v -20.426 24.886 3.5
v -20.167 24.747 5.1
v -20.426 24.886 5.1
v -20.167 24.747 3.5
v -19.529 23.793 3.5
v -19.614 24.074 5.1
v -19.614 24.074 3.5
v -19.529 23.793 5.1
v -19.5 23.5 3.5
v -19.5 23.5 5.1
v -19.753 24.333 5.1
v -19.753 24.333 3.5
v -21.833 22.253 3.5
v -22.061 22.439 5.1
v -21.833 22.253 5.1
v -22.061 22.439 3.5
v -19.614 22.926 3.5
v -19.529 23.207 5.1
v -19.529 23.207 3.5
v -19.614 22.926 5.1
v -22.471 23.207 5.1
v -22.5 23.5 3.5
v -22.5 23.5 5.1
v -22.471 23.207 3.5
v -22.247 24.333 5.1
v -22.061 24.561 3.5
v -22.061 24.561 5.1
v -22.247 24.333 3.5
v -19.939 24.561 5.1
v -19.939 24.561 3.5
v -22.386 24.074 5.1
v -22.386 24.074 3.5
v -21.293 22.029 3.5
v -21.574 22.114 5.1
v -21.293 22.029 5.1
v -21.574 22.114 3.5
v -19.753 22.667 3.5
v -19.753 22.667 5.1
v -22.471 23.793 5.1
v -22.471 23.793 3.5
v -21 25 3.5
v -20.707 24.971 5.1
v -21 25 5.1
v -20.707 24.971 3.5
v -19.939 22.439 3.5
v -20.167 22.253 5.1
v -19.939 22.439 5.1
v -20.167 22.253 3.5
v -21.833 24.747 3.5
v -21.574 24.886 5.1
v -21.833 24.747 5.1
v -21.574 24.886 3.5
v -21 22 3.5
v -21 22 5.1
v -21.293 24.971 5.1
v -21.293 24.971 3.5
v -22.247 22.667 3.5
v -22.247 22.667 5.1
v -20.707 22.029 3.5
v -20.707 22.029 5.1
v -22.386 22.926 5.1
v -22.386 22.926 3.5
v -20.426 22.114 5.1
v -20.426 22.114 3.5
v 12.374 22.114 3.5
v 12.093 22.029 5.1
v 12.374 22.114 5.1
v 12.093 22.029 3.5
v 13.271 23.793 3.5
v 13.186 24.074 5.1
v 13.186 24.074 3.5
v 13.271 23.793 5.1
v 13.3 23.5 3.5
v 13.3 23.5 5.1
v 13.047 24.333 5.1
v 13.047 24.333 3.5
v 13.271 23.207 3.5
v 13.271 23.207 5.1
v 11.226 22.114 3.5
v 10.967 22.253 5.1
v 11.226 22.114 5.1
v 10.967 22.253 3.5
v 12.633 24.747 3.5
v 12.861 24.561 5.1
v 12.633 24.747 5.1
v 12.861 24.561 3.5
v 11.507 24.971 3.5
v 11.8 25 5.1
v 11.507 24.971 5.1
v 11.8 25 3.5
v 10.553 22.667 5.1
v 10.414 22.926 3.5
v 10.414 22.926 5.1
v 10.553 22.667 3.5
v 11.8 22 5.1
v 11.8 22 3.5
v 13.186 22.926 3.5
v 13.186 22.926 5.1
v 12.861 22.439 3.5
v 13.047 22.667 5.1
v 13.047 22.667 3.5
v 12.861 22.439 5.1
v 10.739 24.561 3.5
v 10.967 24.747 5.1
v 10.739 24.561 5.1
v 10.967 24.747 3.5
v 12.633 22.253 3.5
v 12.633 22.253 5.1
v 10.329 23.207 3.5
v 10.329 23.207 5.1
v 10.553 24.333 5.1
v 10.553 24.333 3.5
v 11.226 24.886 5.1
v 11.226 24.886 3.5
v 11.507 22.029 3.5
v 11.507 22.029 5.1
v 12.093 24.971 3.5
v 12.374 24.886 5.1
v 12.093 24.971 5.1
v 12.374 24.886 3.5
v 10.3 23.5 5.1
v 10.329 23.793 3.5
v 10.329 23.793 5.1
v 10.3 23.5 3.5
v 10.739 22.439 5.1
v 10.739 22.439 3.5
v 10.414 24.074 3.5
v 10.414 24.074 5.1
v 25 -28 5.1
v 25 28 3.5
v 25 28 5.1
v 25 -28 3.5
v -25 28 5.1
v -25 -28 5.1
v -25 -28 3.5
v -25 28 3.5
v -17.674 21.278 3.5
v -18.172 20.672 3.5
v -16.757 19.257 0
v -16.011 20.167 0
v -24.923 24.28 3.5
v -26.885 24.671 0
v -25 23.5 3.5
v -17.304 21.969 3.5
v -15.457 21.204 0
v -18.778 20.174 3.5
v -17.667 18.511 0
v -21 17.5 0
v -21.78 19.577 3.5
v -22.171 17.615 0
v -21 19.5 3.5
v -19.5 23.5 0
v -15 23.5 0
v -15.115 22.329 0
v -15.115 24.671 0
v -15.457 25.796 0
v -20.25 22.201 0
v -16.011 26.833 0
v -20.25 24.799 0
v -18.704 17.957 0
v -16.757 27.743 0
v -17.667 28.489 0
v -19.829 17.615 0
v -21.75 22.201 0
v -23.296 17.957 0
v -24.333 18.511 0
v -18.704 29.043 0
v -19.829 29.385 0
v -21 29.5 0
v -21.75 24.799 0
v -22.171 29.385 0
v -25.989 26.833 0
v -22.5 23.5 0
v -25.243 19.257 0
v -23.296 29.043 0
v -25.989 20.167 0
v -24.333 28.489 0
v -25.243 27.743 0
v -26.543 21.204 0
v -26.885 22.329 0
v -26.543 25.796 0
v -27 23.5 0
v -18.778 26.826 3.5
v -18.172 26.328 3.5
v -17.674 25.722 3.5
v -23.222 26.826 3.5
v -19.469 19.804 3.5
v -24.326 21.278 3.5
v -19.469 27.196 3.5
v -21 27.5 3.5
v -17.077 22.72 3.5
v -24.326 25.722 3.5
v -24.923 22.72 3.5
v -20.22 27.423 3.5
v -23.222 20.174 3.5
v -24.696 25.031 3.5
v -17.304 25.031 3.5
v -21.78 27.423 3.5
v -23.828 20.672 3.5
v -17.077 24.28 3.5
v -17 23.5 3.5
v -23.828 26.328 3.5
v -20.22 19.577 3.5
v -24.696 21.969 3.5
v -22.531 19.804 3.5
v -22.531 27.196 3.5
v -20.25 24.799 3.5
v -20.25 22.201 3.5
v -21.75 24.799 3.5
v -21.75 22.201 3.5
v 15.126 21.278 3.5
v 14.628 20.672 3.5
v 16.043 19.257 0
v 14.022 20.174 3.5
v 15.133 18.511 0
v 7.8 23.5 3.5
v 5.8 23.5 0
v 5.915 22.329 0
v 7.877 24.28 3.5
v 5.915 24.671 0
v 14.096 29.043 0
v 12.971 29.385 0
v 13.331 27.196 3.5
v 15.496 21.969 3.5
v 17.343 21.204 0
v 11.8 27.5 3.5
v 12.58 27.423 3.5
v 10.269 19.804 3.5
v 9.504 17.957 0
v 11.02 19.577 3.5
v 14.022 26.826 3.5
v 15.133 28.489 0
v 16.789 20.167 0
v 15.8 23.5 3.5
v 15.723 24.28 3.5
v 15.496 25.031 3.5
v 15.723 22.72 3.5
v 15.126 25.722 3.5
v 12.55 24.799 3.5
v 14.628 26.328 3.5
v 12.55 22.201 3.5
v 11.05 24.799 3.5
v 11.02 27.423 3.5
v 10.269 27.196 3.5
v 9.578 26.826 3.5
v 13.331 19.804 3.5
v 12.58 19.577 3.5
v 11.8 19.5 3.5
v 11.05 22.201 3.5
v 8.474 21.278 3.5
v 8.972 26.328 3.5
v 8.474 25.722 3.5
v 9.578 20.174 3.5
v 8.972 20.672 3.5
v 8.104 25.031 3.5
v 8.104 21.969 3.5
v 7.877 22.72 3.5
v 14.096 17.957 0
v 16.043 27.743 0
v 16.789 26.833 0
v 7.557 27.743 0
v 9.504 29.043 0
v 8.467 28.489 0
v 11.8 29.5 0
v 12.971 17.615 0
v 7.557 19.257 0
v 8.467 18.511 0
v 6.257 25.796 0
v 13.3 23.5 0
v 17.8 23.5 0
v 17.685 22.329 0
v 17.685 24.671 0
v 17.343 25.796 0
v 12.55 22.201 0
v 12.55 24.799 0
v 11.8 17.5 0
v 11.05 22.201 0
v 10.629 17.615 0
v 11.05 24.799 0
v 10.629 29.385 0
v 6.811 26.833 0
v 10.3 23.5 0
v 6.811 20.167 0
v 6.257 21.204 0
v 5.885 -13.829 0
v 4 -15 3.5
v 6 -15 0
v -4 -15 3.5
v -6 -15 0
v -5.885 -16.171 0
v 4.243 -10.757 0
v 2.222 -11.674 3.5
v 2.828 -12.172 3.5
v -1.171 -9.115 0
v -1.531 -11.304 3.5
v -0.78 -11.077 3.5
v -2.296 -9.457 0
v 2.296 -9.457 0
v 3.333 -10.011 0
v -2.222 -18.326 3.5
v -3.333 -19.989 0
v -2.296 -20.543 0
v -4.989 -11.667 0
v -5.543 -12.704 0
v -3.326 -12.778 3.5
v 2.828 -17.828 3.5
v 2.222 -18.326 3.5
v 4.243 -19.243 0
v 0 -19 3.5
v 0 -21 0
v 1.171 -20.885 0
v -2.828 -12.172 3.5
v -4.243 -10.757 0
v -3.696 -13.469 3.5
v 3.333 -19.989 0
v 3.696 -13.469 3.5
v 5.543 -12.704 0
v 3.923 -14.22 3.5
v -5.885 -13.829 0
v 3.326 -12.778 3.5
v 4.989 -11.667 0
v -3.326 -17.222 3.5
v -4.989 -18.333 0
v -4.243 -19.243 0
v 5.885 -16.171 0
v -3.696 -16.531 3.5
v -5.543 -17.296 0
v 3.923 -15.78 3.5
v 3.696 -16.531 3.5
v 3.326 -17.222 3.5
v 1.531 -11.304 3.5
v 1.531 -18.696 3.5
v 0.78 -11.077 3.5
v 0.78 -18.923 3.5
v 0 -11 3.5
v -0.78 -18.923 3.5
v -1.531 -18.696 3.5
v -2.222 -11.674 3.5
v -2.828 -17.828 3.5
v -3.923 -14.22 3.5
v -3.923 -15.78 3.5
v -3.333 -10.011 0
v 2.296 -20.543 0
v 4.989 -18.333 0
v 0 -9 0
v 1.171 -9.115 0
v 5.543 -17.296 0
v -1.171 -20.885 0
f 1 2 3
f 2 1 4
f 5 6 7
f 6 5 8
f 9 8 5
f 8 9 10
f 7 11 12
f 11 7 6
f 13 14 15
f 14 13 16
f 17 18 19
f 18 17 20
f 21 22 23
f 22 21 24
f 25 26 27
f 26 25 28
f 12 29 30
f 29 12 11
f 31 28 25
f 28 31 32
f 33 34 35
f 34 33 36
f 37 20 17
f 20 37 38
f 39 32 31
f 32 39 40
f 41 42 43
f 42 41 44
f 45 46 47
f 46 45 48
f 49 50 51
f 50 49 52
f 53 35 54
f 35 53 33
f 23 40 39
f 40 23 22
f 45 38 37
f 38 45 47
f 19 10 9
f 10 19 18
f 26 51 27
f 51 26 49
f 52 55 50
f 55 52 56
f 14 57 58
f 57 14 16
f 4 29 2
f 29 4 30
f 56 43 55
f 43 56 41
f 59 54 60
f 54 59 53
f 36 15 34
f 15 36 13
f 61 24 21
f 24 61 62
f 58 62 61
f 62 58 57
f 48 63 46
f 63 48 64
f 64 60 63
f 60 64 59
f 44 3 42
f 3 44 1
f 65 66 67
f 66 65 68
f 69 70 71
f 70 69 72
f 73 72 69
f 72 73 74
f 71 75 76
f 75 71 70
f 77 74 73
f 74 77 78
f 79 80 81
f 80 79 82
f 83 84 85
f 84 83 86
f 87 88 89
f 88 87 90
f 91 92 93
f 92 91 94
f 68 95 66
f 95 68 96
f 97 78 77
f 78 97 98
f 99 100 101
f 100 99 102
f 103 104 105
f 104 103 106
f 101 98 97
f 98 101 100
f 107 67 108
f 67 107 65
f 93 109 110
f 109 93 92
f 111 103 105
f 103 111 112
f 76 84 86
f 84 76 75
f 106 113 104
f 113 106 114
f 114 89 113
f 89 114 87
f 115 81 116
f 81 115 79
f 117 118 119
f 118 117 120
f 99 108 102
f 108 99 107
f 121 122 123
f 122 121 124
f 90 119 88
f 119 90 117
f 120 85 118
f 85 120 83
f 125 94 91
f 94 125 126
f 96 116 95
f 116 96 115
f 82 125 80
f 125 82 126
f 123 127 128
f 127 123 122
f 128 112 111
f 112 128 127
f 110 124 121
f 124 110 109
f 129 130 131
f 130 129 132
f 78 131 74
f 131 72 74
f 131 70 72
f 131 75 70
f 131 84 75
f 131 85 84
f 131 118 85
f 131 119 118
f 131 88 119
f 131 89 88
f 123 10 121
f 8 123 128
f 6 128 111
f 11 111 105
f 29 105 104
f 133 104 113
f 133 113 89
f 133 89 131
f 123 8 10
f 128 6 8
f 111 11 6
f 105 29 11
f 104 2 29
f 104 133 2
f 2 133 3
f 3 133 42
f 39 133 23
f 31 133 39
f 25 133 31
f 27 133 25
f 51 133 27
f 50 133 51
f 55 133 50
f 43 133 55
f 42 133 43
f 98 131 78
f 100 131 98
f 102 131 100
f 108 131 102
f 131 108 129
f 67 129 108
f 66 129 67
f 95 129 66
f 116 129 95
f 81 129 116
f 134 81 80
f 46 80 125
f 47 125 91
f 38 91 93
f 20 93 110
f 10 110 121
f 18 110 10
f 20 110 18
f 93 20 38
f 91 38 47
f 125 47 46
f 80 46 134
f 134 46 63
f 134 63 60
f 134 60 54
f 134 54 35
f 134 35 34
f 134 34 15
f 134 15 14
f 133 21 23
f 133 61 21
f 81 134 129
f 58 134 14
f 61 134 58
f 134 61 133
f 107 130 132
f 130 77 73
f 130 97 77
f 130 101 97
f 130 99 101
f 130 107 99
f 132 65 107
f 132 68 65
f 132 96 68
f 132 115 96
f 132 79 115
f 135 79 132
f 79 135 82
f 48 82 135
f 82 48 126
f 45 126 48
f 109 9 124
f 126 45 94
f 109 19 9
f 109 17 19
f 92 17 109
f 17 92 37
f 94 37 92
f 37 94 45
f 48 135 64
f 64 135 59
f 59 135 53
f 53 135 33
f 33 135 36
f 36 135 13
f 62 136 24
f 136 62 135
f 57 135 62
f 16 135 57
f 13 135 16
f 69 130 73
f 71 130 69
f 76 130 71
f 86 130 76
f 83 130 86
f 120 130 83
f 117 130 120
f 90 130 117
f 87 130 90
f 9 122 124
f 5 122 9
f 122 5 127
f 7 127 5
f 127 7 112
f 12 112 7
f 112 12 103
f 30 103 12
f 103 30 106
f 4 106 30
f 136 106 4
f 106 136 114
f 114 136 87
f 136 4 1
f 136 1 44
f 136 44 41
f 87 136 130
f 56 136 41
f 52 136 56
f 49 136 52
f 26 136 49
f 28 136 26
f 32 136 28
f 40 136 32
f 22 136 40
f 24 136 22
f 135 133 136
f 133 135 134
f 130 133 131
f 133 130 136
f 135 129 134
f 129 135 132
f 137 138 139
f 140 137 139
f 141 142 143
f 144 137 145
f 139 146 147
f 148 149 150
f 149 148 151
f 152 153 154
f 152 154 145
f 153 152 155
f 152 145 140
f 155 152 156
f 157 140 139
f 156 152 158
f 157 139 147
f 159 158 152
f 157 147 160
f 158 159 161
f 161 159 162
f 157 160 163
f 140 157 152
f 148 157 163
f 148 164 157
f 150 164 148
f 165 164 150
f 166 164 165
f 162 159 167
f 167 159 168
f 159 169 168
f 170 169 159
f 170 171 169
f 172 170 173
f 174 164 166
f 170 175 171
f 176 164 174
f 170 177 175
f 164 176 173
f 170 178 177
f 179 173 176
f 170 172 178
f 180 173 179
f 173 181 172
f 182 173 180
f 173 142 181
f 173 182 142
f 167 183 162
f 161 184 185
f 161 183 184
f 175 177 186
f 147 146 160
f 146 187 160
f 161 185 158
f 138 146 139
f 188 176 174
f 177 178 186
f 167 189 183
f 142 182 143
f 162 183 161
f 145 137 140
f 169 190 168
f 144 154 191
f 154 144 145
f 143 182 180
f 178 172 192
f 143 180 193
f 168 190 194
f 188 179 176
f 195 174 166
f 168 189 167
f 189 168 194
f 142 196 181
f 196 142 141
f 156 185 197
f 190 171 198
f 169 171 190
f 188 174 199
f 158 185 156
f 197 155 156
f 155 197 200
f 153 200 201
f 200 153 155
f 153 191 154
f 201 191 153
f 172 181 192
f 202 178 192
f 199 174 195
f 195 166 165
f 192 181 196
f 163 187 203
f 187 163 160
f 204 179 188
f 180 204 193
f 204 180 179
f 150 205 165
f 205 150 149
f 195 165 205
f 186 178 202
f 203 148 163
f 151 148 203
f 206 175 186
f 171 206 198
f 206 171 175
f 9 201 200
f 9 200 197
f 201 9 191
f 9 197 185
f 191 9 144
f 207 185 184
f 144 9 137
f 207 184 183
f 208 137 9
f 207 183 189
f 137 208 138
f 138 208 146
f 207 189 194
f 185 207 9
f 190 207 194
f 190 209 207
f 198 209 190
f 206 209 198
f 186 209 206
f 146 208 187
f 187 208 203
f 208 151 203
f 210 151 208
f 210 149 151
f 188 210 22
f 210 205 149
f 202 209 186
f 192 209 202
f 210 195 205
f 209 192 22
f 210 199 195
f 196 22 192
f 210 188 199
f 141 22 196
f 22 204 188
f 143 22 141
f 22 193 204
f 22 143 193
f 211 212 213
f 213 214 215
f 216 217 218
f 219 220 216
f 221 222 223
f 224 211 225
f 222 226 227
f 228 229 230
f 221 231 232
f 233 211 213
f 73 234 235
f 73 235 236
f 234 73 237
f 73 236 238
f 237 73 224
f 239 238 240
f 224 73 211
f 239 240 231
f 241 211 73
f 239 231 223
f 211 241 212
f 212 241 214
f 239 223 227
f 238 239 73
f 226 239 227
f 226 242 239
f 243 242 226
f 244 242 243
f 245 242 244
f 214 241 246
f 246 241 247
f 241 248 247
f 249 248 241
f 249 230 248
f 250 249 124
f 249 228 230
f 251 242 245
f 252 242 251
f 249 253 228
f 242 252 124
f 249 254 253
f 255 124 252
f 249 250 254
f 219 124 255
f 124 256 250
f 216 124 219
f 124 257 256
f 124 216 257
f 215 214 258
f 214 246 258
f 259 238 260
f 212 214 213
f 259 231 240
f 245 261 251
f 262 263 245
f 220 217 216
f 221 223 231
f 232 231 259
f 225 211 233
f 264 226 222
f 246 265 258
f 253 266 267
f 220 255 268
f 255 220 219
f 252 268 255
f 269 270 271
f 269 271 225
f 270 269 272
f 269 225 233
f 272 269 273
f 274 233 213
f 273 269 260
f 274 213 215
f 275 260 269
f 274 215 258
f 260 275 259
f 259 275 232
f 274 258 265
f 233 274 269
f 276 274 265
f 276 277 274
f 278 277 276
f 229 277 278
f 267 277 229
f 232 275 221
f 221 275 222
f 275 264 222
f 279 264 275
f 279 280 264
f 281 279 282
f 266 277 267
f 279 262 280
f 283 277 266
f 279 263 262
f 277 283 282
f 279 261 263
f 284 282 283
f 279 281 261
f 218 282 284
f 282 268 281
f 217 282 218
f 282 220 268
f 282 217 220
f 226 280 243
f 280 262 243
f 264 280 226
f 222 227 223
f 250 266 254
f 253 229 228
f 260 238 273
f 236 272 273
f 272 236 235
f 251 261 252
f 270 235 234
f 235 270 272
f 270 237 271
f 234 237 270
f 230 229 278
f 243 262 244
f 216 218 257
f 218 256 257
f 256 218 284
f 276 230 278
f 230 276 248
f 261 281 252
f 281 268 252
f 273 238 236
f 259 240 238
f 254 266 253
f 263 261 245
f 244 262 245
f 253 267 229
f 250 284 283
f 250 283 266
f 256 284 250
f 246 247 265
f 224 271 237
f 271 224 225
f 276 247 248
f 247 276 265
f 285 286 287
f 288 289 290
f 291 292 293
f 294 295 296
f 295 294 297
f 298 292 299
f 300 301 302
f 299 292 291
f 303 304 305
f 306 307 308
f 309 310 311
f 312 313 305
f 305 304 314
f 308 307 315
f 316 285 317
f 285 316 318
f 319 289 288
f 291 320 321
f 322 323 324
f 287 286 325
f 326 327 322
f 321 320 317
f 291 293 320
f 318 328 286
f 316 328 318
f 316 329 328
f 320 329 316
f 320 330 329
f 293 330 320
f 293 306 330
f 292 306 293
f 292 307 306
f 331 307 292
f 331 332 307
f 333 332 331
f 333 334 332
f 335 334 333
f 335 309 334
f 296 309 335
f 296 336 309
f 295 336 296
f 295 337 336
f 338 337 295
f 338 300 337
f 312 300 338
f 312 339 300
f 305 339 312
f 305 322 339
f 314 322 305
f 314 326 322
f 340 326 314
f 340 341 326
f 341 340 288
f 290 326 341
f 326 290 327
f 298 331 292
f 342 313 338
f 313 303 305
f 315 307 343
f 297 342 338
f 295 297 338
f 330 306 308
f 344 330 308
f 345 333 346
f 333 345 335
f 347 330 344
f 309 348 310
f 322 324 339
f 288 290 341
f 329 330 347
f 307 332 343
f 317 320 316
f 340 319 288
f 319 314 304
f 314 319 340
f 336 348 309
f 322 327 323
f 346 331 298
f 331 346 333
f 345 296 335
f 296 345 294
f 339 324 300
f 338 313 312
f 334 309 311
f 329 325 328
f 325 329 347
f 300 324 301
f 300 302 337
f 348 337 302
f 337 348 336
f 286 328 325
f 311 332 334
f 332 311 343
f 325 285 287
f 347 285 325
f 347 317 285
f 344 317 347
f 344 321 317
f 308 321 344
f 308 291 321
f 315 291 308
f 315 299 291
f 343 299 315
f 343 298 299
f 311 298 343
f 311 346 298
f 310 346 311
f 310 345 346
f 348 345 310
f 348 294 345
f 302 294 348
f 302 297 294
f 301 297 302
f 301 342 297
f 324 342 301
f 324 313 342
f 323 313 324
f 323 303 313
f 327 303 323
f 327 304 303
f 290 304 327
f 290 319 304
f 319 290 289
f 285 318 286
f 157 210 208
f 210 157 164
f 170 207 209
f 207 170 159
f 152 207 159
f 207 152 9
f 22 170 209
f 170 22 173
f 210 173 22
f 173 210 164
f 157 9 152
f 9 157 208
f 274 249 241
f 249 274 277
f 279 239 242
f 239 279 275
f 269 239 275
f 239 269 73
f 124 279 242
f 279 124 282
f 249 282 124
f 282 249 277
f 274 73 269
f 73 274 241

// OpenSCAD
z_offset = 3.5;

mounting_hole_positions = [
  [-(50 / 2) + 4, (56 / 2) - 4.5],
  [-(50 / 2) + 4 + 32.8, (56 / 2) - 4.5],
];
support_positions = [
  [-(50 / 2) + 4, (56 / 2) - 4.5],
  [-(50 / 2) + 4 + 32.8, (56 / 2) - 4.5],
  [0, -15],
];

module YYNMOS4_device() {
  translate([0, 0, (1.6 / 2) + z_offset]) {
    difference() {
      cube([50, 56, 1.6], center = true);

      // Mounting holes
      for (pos = mounting_hole_positions) {
        translate([pos[0], pos[1], 0]) {
          cylinder(h = 1.7, d = 3, $fn = 32, center = true);
        }
      }
    }
  }
}

module YYNMOS4_add() {
  // Mouting hole supports
  for (pos = support_positions) {
    translate([pos[0], pos[1]]) {
      cylinder(h = z_offset, d1 = 12, d2 = 8, $fn = 32);
    }
  }
}

module YYNMOS4_subtract(hole_extra_depth = 0) {
  // Mouting hole cutouts
  for (pos = mounting_hole_positions) {
    translate([pos[0], pos[1], -hole_extra_depth]) {
      cylinder(h = 1.6 + 3.5 + hole_extra_depth, d = 3, $fn = 6);
    }
  }
}

color("grey", 0.5) {
  YYNMOS4_device();
}
difference() {
  color("green") {
    YYNMOS4_add();
  }
  #YYNMOS4_subtract(hole_extra_depth = 1);
}
